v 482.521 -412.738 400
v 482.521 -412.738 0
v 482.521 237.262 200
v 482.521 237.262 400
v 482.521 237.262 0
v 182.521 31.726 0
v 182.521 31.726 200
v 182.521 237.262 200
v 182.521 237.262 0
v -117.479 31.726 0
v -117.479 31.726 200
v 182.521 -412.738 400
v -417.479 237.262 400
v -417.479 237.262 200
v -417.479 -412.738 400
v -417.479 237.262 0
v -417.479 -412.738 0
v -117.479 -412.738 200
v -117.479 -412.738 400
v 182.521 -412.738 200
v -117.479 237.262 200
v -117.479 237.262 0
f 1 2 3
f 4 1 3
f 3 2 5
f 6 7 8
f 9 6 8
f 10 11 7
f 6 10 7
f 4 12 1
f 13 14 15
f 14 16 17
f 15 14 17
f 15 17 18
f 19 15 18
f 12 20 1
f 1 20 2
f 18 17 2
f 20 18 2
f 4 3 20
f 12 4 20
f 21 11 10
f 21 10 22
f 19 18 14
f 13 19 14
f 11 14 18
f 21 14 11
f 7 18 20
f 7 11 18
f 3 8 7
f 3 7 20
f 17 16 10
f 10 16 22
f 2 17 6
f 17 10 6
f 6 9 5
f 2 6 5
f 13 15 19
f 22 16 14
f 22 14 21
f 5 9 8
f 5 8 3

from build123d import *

# Parameters (mm, degrees)
F0_W     = 900
F0_H     = 650
F1_DEPTH = 200
F3_DEPTH = 200
F5_DEPTH = 200
F6_W     = 300
F6_H     = 205.535657
F7_DEPTH = 281.52459


with BuildPart() as f1:
    # F0 (on Top) → F1 (new body)
    with BuildSketch(Plane.XY):
        with Locations((32.520793, -87.737992)):
            Rectangle(F0_W, F0_H)
    extrude(amount=F1_DEPTH)

    # F2 (on face) → F3 (join)
    with BuildSketch(Plane.XY.offset(200)):
        Polygon((-117.479207, -412.737992), (-417.479207, 237.262008), (-417.479207, -412.737992), align=None)
    extrude(amount=F3_DEPTH)

    # F4 (on face) → F5 (join)
    with BuildSketch(Plane.XY.offset(200)):
        Polygon((482.520793, -412.737992), (482.520793, 237.262008), (182.520793, -412.737992), align=None)
    extrude(amount=F5_DEPTH)

    # F6 (on face) → F7 (cut)
    with BuildSketch(Plane.XY.offset(200)):
        with Locations((32.520793, 134.49418)):
            Rectangle(F6_W, F6_H)
    extrude(amount=-F7_DEPTH, mode=Mode.SUBTRACT)


solid = f1.part
